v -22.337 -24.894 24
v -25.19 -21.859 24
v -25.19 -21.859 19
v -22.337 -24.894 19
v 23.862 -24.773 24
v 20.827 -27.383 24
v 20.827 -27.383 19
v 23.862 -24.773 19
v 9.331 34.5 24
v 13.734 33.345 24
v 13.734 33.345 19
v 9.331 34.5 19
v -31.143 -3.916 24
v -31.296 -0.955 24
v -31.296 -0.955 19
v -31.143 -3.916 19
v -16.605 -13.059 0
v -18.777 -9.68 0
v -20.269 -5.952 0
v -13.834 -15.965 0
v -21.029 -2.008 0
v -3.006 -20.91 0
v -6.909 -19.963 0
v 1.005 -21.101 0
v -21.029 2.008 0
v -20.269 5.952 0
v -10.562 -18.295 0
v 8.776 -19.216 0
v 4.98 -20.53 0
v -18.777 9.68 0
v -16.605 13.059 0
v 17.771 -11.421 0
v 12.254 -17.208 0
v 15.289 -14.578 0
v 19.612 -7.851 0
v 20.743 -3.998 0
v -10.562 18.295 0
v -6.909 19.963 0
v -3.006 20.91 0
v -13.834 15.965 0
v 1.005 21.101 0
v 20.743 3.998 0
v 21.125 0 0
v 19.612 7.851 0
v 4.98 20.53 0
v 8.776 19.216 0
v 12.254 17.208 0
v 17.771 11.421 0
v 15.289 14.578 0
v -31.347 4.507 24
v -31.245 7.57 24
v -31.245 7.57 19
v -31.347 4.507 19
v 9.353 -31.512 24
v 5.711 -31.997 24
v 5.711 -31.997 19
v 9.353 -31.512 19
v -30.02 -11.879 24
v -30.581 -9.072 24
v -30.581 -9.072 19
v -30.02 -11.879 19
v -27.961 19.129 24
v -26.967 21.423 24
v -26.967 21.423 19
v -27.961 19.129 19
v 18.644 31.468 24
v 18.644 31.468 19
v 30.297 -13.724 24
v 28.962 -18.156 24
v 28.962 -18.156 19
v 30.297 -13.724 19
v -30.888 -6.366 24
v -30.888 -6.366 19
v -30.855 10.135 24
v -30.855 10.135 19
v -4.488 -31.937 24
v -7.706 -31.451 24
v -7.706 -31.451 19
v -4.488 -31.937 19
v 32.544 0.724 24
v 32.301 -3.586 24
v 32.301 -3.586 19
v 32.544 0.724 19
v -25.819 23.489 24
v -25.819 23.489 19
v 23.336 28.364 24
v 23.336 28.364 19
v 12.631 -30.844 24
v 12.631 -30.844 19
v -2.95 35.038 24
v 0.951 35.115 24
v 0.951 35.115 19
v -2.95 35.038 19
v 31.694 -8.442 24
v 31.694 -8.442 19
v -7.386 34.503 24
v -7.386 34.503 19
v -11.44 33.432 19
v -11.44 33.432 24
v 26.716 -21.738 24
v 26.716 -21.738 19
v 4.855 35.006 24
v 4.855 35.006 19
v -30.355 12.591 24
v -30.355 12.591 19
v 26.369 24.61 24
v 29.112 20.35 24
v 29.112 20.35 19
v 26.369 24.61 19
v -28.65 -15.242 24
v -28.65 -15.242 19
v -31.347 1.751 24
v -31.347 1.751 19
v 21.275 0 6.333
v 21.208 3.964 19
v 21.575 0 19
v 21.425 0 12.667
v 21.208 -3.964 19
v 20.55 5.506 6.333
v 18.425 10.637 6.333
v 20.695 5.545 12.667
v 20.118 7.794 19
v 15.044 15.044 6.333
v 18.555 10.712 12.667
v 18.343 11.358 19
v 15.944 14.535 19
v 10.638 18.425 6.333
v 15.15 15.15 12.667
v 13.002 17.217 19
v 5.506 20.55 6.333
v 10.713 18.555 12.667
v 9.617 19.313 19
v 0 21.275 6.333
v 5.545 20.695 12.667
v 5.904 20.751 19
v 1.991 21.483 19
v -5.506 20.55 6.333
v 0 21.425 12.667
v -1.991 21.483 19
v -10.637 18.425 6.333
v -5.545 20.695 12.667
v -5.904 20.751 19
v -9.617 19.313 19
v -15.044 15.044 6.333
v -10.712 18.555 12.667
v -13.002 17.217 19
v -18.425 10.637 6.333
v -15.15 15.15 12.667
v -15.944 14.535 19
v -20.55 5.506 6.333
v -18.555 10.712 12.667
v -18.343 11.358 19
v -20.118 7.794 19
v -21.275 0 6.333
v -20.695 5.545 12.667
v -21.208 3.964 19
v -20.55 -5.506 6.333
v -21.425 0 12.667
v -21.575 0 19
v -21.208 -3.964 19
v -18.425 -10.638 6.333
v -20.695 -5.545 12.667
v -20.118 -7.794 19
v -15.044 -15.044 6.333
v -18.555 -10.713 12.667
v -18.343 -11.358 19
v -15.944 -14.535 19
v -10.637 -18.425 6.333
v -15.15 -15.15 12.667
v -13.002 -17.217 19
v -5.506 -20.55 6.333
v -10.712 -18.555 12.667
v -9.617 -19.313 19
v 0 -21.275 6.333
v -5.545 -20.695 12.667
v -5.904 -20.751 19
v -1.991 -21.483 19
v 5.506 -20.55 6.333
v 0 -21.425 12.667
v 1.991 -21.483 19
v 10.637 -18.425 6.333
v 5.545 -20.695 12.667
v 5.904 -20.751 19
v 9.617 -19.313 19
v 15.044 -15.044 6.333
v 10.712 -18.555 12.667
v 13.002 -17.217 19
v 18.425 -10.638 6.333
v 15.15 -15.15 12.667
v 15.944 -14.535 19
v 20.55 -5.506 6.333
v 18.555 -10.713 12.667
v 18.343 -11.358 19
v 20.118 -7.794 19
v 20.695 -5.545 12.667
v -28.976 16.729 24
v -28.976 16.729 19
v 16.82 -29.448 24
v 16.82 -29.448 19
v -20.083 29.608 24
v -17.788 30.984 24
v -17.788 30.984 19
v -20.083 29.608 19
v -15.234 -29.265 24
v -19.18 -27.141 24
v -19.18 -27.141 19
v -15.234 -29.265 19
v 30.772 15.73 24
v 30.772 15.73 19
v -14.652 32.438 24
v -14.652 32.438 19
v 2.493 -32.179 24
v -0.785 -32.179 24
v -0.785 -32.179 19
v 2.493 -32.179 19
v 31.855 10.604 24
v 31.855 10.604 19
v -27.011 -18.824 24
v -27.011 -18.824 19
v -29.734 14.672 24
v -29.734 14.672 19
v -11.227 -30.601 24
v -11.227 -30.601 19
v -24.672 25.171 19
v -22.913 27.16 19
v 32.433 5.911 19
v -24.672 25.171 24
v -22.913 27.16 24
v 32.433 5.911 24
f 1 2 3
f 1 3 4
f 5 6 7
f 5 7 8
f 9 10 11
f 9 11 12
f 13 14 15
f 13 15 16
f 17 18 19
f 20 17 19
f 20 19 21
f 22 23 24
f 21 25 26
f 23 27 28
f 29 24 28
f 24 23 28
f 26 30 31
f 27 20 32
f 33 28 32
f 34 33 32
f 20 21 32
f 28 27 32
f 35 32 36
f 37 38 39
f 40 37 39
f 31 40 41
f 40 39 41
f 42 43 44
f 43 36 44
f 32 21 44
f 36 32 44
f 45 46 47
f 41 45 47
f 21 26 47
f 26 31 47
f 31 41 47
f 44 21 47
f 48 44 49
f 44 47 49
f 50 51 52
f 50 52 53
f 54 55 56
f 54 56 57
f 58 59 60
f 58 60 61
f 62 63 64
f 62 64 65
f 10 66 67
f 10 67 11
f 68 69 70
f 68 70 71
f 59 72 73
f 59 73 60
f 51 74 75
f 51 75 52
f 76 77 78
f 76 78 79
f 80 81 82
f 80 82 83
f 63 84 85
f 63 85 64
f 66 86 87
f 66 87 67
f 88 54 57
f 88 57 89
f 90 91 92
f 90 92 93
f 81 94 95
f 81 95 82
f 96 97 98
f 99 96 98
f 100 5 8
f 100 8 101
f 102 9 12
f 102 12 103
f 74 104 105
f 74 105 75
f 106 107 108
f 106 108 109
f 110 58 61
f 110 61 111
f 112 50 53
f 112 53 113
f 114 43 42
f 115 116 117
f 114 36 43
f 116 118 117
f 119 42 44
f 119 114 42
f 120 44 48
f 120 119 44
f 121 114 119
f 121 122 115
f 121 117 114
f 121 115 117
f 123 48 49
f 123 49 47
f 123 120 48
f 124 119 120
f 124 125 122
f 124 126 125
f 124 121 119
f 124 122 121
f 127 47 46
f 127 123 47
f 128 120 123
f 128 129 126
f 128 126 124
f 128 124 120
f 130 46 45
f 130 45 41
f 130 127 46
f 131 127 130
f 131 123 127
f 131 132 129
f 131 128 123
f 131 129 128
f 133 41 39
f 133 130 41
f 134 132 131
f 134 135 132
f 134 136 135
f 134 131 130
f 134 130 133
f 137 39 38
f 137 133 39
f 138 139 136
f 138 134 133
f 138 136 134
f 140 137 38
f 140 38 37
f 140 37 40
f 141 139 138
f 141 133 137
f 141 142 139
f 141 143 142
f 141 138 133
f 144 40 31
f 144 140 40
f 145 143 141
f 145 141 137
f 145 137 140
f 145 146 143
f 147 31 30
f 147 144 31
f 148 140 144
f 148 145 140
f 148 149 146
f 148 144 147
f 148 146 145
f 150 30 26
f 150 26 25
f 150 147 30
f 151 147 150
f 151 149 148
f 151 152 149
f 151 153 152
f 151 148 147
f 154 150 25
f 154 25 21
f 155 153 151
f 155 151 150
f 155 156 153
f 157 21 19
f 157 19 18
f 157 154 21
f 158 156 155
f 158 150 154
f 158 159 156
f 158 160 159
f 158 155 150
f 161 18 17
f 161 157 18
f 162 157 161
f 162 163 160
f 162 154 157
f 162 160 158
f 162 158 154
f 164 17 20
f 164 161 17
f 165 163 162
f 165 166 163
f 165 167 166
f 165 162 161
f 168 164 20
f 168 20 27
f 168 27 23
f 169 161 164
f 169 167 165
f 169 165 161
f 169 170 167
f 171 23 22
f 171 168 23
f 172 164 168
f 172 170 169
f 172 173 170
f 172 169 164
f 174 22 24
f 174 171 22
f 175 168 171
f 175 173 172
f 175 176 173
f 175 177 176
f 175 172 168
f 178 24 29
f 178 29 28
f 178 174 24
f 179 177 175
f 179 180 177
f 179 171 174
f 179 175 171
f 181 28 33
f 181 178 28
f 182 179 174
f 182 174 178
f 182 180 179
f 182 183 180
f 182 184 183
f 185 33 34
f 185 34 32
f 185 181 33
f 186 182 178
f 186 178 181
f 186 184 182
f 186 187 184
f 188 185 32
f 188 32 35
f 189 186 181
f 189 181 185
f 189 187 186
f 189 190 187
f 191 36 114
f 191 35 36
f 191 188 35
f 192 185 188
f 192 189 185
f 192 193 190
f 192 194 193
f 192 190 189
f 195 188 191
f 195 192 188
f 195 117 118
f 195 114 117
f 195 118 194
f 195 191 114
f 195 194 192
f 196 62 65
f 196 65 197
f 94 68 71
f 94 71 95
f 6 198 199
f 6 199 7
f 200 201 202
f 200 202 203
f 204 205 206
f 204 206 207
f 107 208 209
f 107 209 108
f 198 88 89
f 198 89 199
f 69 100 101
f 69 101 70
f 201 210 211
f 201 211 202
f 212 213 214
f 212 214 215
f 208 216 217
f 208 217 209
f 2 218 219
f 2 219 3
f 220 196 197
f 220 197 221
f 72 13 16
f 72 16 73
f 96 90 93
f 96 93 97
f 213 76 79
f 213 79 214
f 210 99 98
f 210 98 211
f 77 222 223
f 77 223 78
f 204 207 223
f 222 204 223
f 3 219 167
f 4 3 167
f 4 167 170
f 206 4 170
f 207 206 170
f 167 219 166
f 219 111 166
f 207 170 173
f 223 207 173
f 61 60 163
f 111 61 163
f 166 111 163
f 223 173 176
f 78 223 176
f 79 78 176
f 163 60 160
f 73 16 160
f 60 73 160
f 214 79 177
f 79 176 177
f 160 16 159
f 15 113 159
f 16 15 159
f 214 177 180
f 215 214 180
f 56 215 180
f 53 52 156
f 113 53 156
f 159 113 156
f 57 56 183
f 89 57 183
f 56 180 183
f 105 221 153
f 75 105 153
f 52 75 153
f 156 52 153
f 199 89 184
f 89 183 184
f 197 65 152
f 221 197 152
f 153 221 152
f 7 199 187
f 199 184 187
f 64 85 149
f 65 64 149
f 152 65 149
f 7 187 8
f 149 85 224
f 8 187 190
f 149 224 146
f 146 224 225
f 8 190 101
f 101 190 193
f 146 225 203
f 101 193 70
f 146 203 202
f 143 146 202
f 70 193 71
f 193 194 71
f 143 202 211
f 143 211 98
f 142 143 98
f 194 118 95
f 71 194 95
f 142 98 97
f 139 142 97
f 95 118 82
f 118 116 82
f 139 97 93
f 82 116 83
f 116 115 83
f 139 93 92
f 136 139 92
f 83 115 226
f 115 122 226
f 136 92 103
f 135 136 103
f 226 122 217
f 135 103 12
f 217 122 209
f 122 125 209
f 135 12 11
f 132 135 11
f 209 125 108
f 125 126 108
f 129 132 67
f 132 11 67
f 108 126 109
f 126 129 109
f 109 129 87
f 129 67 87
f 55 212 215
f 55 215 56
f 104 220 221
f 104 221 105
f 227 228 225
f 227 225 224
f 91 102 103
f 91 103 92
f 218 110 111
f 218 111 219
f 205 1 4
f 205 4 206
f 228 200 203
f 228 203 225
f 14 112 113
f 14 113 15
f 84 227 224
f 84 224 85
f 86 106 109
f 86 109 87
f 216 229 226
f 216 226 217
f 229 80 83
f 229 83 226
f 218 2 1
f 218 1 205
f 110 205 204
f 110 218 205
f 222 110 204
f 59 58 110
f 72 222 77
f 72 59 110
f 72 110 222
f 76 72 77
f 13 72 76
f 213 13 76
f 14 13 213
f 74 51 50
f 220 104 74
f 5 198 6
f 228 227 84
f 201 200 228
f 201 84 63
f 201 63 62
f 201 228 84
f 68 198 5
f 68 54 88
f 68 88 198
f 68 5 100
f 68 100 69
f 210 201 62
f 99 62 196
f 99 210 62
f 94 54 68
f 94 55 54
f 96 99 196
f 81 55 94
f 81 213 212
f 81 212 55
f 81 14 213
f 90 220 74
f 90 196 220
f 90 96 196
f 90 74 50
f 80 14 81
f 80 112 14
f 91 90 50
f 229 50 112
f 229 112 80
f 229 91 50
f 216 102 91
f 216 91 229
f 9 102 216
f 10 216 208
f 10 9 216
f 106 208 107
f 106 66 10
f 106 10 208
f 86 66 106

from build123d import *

# Parameters (mm, degrees)
F0_R     = 21.125
F2_R     = 21.575
F6_DEPTH = 5


with BuildPart() as f5:
    # F0 (on Top) → F5 section 0
    with BuildSketch(Plane.XY):
        Circle(F0_R)
    # F2 (on offset) → F5 section 1
    with BuildSketch(Plane.XY.offset(19)):
        Circle(F2_R)
    loft()

    # F4 (on offset) → F6 (join, through all)
    with BuildSketch(Plane.XY.offset(24)):
        Polygon((4.8545051575, 35.0056151581), (0.9513065061, 35.1146380116), (-2.9495599623, 35.0381506747), (-7.3858366721, 34.5027381994), (-11.4396800482, 33.431911015), (-14.6521593676, 32.4375728429), (-17.788150233, 30.9843078571), (-20.0827770418, 29.607532442), (-22.9128230274, 27.1599287256), (-24.6720395948, 25.1712512644), (-25.8193485314, 23.4885242679), (-26.9666664035, 21.4233594698), (-27.961007368, 19.1287304272), (-28.9760252346, 16.7291352786), (-29.7340651287, 14.6715869345), (-30.3550512956, 12.5905871947), (-30.8553268874, 10.1346778688), (-31.2450337726, 7.5703957518), (-31.3471315616, 4.5074330419), (-31.3471315616, 1.7507681666), (-31.2960826671, -0.9548455803), (-31.1429359836, -3.9157082674), (-30.8876915112, -6.3660775418), (-30.5813892087, -9.0716912887), (-30.0198513693, -11.8794072923), (-28.6502880738, -15.241816491), (-27.0111655274, -18.823602796), (-25.1899182536, -21.8590149189), (-22.3366308581, -24.8944315096), (-19.1798022503, -27.1406364806), (-15.2337664905, -29.2654249666), (-11.2270224883, -30.6010063007), (-7.7059444257, -31.4509216951), (-4.4884075754, -31.9365876348), (-0.7852047855, -32.1794206046), (2.4930403073, -32.1794206046), (5.7105771576, -31.9972958772), (9.3530806406, -31.5116299376), (12.6313257334, -30.8438392705), (16.820194463, -29.447549694), (20.8269295296, -27.3834694504), (23.8623461203, -24.7730150247), (26.7156335159, -21.7376029018), (28.9618384868, -18.155812129), (30.2974198209, -13.7241104295), (31.6937093974, -8.4424933357), (32.300791822, -3.585833939), (32.5436247918, 0.7244512755), (32.4328684384, 5.9111592441), (31.8553135951, 10.6038152433), (30.7723898868, 15.7296362581), (29.111915803, 20.3500951095), (26.3685180109, 24.6095816254), (23.3363405633, 28.3637048611), (18.643684564, 31.4680761057), (13.7344482909, 33.3451377235), (9.3305719472, 34.5002518779), align=None)
    extrude(amount=-F6_DEPTH)


solid = f5.part
